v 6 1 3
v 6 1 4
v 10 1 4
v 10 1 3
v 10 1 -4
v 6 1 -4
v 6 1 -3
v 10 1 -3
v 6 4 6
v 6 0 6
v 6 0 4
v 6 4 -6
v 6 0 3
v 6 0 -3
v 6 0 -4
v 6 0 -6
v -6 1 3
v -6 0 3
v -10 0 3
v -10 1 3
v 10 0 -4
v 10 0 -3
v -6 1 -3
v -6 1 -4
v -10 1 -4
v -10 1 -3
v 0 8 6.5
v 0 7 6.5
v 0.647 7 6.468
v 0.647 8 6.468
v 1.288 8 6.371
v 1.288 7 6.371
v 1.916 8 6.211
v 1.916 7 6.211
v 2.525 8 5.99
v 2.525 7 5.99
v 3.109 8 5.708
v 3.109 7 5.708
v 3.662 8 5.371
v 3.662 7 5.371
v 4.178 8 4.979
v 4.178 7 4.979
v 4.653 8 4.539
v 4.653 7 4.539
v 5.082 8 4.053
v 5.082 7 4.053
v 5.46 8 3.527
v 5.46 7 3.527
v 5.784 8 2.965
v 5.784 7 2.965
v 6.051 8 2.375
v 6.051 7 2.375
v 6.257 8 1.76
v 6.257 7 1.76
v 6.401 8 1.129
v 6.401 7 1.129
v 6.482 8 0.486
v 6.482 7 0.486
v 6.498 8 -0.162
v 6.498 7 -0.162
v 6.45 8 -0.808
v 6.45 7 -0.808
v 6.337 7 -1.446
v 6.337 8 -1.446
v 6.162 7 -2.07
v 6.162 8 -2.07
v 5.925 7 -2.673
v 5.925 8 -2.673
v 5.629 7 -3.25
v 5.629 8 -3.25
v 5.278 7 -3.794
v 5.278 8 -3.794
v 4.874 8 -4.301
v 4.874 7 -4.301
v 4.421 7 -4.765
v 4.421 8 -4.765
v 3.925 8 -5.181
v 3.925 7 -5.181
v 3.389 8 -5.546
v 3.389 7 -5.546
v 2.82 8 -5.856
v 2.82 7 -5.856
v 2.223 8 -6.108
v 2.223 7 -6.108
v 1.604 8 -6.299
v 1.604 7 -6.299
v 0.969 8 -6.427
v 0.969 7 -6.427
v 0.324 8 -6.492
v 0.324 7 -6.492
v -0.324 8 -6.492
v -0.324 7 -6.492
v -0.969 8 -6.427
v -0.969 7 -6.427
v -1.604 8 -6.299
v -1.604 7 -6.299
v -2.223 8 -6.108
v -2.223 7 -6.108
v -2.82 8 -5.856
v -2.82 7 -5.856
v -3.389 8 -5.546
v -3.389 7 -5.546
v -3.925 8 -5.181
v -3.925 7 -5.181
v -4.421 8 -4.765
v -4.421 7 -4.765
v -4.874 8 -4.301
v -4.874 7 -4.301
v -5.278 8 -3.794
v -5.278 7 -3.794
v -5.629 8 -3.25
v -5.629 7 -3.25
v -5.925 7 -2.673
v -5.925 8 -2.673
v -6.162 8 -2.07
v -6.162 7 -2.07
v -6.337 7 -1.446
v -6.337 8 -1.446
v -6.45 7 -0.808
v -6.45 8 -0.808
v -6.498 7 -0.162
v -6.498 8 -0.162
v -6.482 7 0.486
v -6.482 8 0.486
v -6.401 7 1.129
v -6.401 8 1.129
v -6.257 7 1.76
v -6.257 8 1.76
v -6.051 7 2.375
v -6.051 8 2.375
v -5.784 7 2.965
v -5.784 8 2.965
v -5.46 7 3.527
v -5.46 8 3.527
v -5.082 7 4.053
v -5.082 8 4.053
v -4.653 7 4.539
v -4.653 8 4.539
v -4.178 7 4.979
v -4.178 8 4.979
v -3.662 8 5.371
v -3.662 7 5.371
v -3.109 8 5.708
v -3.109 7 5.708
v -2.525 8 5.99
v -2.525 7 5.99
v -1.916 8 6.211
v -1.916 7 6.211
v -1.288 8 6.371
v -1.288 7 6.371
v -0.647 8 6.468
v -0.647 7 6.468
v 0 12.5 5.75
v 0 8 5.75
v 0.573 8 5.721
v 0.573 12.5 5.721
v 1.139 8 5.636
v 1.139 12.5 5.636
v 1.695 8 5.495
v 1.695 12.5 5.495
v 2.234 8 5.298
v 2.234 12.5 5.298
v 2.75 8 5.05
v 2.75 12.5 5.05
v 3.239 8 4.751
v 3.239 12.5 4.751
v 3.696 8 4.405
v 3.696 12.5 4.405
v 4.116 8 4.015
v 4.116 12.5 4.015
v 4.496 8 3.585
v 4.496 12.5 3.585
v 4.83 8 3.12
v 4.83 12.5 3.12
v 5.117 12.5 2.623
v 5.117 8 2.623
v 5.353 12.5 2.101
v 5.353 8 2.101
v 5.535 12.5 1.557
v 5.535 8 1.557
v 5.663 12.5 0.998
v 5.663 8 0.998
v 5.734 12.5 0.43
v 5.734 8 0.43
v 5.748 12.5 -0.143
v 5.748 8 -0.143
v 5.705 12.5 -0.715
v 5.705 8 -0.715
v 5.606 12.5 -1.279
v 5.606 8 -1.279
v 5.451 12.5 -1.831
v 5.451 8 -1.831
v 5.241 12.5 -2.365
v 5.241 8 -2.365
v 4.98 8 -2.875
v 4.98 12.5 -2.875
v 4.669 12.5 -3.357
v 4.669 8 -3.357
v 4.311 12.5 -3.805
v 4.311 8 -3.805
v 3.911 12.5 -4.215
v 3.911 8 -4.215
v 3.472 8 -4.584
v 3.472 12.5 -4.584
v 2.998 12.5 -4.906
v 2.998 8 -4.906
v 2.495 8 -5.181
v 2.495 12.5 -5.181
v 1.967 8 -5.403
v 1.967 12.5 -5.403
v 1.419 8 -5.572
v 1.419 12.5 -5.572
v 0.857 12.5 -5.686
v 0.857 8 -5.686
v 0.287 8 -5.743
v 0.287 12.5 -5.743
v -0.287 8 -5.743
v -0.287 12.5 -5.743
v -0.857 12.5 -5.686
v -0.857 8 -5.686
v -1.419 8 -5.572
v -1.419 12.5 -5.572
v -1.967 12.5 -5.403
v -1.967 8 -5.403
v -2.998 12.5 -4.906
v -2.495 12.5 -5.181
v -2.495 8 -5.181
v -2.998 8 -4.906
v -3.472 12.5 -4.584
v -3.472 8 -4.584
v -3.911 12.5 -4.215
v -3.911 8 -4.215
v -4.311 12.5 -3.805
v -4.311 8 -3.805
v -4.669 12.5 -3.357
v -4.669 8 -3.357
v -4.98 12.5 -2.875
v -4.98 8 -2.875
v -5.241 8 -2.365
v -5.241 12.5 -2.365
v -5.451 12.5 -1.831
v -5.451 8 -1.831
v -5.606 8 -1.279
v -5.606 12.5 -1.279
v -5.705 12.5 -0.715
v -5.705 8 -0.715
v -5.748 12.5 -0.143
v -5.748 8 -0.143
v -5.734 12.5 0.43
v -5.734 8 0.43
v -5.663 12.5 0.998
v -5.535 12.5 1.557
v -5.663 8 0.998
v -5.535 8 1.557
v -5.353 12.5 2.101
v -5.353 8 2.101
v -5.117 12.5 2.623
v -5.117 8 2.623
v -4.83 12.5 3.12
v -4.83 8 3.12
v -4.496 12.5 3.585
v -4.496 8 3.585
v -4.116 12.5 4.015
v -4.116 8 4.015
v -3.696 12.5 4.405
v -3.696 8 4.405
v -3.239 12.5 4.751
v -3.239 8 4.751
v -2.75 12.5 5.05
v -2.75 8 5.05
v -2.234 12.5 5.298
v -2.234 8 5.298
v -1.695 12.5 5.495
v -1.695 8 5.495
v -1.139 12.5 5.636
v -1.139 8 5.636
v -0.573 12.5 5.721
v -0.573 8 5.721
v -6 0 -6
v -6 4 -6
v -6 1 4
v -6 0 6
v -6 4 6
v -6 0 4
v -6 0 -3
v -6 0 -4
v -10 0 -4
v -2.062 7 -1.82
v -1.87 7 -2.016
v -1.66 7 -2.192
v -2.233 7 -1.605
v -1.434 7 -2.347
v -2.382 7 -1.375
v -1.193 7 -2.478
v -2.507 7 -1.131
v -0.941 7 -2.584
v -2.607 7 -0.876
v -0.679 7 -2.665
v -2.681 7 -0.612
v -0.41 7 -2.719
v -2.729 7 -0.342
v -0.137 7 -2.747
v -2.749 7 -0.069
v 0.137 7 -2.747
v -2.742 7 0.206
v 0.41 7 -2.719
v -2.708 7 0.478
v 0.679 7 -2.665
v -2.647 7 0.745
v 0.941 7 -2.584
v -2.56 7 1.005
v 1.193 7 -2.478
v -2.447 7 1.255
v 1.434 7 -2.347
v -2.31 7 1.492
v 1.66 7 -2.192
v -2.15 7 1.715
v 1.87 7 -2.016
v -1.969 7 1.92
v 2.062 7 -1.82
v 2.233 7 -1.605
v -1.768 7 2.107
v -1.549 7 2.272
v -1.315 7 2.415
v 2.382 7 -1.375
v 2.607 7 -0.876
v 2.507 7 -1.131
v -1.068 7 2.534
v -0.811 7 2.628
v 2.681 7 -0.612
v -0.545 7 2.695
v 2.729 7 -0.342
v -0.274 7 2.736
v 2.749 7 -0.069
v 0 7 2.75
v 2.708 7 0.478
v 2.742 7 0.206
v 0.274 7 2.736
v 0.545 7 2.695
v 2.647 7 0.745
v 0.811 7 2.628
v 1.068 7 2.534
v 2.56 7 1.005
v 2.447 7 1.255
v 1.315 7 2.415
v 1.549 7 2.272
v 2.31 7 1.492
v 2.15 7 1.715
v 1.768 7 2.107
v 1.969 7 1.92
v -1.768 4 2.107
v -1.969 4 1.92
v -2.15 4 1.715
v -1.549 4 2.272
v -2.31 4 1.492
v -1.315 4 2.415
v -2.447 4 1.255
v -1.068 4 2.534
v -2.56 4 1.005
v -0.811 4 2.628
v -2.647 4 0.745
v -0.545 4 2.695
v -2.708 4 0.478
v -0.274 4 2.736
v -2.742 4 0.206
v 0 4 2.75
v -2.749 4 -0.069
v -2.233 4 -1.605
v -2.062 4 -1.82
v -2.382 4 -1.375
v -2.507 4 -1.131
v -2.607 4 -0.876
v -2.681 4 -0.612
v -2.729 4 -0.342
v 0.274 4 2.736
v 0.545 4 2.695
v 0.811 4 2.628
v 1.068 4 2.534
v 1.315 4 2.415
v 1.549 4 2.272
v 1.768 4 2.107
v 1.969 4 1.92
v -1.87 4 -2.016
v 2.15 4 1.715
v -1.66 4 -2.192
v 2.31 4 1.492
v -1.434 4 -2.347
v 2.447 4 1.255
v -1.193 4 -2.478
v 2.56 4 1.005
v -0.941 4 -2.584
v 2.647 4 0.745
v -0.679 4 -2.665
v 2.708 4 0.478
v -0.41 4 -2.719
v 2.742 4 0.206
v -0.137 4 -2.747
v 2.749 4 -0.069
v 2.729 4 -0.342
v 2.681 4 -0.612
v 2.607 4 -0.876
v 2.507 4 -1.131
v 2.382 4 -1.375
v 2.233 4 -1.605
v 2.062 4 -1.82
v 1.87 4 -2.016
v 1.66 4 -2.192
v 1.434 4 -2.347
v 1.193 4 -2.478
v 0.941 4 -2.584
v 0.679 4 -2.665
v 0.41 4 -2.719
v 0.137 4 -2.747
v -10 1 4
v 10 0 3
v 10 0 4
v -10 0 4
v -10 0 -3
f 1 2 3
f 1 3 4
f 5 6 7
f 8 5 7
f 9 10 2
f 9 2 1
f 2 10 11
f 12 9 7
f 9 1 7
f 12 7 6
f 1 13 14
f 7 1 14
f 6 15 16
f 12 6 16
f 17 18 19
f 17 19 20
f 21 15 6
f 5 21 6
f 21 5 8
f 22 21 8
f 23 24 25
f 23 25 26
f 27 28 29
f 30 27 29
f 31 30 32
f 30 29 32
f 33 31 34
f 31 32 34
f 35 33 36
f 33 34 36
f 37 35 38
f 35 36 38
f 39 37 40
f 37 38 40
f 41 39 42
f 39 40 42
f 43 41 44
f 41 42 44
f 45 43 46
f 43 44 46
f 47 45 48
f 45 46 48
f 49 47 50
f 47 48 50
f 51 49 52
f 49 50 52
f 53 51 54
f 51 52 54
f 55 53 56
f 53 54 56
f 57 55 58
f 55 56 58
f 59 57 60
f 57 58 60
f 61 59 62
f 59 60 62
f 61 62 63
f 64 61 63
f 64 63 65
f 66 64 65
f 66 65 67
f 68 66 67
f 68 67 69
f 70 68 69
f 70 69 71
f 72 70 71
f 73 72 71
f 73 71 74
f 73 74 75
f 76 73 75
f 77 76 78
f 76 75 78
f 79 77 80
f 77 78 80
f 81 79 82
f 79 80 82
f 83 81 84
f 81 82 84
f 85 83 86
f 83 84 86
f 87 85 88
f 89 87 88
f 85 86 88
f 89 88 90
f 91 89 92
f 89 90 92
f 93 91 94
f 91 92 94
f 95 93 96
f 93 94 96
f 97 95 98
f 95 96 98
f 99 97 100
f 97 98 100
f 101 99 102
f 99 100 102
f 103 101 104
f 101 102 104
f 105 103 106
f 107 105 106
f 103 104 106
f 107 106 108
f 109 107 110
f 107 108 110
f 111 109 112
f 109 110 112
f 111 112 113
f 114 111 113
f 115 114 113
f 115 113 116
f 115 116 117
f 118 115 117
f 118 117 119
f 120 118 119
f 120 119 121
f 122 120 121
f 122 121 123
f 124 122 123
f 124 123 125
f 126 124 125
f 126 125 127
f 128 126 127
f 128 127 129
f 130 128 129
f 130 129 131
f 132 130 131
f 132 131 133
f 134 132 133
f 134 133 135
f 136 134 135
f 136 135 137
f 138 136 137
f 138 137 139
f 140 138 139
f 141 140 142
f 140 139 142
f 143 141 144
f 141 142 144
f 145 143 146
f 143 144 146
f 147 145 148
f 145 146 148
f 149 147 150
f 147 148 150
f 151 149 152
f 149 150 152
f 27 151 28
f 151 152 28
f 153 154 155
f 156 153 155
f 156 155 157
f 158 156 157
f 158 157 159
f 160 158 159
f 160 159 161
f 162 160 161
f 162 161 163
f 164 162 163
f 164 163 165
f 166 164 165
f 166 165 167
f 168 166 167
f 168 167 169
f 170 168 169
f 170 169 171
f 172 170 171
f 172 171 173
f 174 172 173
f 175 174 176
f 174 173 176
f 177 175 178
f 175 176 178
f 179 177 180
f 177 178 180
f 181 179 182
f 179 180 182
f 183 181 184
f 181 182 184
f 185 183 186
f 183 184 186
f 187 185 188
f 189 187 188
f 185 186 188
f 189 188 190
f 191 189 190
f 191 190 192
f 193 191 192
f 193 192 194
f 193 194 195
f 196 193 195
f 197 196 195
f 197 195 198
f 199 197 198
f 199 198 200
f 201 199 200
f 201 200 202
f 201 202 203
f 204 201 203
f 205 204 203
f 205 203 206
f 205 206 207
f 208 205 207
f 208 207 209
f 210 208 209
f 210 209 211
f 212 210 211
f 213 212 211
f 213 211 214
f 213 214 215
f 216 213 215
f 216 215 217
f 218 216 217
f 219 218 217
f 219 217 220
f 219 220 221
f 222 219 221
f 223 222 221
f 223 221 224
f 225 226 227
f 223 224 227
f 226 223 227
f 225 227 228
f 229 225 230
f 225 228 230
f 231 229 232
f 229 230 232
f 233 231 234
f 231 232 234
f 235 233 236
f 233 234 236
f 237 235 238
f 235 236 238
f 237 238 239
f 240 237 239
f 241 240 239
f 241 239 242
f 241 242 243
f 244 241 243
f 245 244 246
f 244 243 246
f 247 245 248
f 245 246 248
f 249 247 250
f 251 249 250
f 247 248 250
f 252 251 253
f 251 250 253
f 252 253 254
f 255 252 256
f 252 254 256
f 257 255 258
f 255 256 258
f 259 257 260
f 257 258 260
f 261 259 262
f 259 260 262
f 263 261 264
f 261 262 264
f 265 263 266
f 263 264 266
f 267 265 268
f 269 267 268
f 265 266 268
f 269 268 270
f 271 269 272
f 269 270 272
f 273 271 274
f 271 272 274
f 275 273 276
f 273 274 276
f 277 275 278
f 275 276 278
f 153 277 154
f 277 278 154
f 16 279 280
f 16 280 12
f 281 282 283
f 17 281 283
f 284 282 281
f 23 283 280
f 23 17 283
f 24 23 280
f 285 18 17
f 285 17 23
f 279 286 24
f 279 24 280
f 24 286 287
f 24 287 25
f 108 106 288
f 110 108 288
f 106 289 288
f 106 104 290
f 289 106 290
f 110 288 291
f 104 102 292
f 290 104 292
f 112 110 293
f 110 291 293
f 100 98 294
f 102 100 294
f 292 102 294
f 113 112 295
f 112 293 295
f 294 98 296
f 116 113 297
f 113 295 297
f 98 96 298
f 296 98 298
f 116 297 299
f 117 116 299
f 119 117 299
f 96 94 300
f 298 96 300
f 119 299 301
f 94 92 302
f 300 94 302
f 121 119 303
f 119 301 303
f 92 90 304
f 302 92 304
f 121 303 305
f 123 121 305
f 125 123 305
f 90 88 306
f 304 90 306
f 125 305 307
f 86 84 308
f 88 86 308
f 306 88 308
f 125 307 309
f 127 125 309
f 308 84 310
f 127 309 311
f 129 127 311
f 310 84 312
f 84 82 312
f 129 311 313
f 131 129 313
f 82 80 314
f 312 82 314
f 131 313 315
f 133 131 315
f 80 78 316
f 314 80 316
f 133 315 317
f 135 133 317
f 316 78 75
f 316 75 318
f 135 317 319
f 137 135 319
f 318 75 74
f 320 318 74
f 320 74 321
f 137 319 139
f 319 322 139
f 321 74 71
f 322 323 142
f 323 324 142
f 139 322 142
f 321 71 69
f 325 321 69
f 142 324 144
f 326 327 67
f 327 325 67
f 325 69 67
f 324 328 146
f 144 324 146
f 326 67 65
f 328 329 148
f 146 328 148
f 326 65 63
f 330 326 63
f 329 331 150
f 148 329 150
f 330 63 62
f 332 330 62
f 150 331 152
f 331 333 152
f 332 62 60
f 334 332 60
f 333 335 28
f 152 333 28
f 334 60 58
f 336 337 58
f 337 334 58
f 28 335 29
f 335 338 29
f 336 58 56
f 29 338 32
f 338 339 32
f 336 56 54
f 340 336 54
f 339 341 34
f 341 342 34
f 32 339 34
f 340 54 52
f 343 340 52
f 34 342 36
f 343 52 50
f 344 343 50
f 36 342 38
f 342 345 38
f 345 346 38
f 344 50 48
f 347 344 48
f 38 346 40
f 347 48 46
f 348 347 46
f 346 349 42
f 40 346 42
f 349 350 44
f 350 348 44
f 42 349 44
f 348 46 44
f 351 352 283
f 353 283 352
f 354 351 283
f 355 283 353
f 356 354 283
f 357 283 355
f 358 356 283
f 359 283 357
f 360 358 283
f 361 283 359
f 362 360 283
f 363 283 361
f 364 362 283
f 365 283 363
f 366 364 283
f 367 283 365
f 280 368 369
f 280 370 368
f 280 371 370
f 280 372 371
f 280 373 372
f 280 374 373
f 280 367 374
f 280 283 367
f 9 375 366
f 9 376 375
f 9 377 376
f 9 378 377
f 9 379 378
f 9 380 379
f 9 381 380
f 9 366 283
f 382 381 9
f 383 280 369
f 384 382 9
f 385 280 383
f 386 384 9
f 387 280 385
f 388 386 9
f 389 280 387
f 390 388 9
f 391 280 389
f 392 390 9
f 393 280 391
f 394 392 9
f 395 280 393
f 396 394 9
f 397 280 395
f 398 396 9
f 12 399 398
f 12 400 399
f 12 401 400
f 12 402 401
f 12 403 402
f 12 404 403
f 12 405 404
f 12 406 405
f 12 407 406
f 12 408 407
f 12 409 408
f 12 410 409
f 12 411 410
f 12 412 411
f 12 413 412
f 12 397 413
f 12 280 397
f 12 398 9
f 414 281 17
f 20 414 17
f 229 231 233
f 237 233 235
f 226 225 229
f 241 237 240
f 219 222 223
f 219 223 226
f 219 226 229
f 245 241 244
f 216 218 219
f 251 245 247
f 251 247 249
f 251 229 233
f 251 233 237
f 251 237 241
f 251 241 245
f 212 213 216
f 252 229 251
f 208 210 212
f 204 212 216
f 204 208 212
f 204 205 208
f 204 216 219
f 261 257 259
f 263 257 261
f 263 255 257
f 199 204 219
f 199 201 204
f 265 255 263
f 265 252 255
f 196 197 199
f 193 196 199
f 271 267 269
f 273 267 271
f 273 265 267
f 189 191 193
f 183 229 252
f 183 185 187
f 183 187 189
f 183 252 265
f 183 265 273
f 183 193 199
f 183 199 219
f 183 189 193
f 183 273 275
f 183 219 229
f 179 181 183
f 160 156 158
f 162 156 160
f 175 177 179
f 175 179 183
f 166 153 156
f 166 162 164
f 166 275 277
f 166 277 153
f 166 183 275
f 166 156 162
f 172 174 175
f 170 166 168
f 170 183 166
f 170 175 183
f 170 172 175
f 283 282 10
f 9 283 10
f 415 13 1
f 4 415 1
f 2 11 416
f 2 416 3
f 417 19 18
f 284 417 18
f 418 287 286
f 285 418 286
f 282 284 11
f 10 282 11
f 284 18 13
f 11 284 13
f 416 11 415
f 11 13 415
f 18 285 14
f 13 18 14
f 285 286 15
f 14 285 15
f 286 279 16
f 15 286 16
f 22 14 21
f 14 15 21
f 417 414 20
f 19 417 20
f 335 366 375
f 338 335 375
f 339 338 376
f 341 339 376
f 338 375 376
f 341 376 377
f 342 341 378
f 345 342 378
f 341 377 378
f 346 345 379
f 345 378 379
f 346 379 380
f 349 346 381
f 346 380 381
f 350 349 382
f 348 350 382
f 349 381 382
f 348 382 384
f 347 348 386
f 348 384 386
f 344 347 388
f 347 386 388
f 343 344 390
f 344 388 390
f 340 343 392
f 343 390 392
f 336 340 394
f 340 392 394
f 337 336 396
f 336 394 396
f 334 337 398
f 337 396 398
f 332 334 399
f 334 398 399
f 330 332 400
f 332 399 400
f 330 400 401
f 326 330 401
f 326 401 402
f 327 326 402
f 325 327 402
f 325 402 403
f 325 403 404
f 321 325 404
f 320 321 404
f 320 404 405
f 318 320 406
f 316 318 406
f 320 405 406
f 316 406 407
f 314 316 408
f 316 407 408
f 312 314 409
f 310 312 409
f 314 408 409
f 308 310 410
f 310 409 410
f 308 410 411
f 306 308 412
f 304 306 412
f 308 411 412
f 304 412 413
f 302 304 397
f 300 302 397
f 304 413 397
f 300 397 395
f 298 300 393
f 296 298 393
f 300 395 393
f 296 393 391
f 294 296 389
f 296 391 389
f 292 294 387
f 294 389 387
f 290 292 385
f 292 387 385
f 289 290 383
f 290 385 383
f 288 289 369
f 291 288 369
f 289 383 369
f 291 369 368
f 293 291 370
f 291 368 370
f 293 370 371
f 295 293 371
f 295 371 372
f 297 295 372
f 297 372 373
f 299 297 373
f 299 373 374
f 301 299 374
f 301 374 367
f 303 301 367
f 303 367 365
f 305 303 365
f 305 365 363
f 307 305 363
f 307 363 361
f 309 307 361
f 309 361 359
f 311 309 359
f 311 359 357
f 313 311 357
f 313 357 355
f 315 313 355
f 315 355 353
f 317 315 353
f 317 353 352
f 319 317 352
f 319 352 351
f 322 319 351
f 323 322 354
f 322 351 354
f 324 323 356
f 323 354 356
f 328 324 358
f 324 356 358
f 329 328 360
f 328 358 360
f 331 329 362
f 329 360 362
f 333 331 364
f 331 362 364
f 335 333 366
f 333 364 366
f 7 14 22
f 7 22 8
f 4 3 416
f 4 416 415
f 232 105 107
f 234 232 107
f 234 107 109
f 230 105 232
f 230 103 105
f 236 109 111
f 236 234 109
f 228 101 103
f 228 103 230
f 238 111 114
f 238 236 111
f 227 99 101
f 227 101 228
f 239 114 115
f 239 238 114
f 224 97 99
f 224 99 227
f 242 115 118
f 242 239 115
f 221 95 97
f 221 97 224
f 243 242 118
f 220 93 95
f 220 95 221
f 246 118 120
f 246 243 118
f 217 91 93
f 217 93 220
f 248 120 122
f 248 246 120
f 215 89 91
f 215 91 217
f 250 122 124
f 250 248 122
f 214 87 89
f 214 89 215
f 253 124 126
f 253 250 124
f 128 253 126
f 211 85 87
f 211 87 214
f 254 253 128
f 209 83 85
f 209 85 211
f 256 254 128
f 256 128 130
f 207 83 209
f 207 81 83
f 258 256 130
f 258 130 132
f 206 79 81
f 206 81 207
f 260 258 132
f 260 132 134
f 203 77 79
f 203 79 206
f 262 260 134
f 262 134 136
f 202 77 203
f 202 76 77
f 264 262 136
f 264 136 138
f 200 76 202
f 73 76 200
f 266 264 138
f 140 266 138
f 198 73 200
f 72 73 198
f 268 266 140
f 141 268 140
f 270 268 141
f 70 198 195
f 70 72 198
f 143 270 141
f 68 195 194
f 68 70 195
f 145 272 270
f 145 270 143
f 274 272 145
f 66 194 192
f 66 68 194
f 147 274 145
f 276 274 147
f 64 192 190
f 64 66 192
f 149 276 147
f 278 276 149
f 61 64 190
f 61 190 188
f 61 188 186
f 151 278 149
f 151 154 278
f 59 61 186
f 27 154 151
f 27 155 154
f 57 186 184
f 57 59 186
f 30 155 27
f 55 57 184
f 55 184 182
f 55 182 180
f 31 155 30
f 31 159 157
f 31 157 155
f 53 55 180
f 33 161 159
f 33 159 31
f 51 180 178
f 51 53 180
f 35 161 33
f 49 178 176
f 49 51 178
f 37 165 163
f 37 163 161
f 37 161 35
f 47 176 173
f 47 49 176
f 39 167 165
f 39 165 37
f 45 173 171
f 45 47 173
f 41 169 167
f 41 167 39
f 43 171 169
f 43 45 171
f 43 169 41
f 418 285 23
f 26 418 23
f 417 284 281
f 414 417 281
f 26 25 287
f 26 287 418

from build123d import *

# Parameters (mm, degrees)
SKETCH1_W               = 12
SKETCH1_H               = 12
BOSS_EXTRUDE1_DEPTH     = 4
SKETCH2_R               = 2.75
BOSS_EXTRUDE2_DEPTH     = 3
SKETCH3_R               = 6.5
BOSS_EXTRUDE3_DEPTH     = 1
BOSS_EXTRUDE4_START     = -1
SKETCH4_R               = 5.75
BOSS_EXTRUDE4_DEPTH     = 5.5
SKETCH5_W               = 1
SKETCH5_H               = 1
BOSS_EXTRUDE5_DEPTH     = 4
MIRROR2_COPY_1_SKETCH_W = 1
MIRROR2_COPY_1_SKETCH_H = 1
MIRROR2_COPY_1_DEPTH    = 4


with BuildPart() as part:
    # Sketch1 → Boss-Extrude1 (new body)
    with BuildSketch(Plane(origin=(0, 0, 0), x_dir=(1, 0, 0), z_dir=(0, 1, 0))):
        Rectangle(SKETCH1_W, SKETCH1_H)
    extrude(amount=BOSS_EXTRUDE1_DEPTH)

    # Sketch2 → Boss-Extrude2 (add)
    with BuildSketch(Plane(origin=(0, 4, 0), x_dir=(1, 0, 0), z_dir=(0, 1, 0))):
        with Locations(Location((0, 0, 0), (0, 0, 270))):
            Circle(SKETCH2_R)
    extrude(amount=BOSS_EXTRUDE2_DEPTH)

    # Sketch3 → Boss-Extrude3 (add)
    with BuildSketch(Plane(origin=(0, 7, 0), x_dir=(1, 0, 0), z_dir=(0, 1, 0))):
        with Locations(Location((0, 0, 0), (0, 0, 270))):
            Circle(SKETCH3_R)
    extrude(amount=BOSS_EXTRUDE3_DEPTH)

    # Sketch4 → Boss-Extrude4 (add)
    with BuildSketch(Plane(origin=(0, 8, 0), x_dir=(1, 0, 0), z_dir=(0, 1, 0)).offset(BOSS_EXTRUDE4_START)):
        with Locations(Location((0, 0, 0), (0, 0, 270))):
            Circle(SKETCH4_R)
    extrude(amount=BOSS_EXTRUDE4_DEPTH)

    # Sketch5 → Boss-Extrude5 (add)
    with BuildSketch(Plane(origin=(6, 0, 0), x_dir=(0, 0, -1), z_dir=(1, 0, 0))):
        with Locations((-3.5, 0.5)):
            Rectangle(SKETCH5_W, SKETCH5_H)
    boss_extrude5 = extrude(amount=BOSS_EXTRUDE5_DEPTH)

    # Mirror1: Boss-Extrude5 across plane
    add(boss_extrude5.mirror(Plane.XY))

    # Mirror2: Boss-Extrude5 across plane
    add(boss_extrude5.mirror(Plane(origin=(0, 0, 0), x_dir=(0, 0, 1), z_dir=(1, 0, 0))))

    # Mirror2 copy 1 sketch → Mirror2 copy 1 (add)
    with BuildSketch(Plane.ZY.offset(6)):
        with Locations((-3.5, 0.5)):
            Rectangle(MIRROR2_COPY_1_SKETCH_W, MIRROR2_COPY_1_SKETCH_H)
    extrude(amount=MIRROR2_COPY_1_DEPTH)


solid = part.part
